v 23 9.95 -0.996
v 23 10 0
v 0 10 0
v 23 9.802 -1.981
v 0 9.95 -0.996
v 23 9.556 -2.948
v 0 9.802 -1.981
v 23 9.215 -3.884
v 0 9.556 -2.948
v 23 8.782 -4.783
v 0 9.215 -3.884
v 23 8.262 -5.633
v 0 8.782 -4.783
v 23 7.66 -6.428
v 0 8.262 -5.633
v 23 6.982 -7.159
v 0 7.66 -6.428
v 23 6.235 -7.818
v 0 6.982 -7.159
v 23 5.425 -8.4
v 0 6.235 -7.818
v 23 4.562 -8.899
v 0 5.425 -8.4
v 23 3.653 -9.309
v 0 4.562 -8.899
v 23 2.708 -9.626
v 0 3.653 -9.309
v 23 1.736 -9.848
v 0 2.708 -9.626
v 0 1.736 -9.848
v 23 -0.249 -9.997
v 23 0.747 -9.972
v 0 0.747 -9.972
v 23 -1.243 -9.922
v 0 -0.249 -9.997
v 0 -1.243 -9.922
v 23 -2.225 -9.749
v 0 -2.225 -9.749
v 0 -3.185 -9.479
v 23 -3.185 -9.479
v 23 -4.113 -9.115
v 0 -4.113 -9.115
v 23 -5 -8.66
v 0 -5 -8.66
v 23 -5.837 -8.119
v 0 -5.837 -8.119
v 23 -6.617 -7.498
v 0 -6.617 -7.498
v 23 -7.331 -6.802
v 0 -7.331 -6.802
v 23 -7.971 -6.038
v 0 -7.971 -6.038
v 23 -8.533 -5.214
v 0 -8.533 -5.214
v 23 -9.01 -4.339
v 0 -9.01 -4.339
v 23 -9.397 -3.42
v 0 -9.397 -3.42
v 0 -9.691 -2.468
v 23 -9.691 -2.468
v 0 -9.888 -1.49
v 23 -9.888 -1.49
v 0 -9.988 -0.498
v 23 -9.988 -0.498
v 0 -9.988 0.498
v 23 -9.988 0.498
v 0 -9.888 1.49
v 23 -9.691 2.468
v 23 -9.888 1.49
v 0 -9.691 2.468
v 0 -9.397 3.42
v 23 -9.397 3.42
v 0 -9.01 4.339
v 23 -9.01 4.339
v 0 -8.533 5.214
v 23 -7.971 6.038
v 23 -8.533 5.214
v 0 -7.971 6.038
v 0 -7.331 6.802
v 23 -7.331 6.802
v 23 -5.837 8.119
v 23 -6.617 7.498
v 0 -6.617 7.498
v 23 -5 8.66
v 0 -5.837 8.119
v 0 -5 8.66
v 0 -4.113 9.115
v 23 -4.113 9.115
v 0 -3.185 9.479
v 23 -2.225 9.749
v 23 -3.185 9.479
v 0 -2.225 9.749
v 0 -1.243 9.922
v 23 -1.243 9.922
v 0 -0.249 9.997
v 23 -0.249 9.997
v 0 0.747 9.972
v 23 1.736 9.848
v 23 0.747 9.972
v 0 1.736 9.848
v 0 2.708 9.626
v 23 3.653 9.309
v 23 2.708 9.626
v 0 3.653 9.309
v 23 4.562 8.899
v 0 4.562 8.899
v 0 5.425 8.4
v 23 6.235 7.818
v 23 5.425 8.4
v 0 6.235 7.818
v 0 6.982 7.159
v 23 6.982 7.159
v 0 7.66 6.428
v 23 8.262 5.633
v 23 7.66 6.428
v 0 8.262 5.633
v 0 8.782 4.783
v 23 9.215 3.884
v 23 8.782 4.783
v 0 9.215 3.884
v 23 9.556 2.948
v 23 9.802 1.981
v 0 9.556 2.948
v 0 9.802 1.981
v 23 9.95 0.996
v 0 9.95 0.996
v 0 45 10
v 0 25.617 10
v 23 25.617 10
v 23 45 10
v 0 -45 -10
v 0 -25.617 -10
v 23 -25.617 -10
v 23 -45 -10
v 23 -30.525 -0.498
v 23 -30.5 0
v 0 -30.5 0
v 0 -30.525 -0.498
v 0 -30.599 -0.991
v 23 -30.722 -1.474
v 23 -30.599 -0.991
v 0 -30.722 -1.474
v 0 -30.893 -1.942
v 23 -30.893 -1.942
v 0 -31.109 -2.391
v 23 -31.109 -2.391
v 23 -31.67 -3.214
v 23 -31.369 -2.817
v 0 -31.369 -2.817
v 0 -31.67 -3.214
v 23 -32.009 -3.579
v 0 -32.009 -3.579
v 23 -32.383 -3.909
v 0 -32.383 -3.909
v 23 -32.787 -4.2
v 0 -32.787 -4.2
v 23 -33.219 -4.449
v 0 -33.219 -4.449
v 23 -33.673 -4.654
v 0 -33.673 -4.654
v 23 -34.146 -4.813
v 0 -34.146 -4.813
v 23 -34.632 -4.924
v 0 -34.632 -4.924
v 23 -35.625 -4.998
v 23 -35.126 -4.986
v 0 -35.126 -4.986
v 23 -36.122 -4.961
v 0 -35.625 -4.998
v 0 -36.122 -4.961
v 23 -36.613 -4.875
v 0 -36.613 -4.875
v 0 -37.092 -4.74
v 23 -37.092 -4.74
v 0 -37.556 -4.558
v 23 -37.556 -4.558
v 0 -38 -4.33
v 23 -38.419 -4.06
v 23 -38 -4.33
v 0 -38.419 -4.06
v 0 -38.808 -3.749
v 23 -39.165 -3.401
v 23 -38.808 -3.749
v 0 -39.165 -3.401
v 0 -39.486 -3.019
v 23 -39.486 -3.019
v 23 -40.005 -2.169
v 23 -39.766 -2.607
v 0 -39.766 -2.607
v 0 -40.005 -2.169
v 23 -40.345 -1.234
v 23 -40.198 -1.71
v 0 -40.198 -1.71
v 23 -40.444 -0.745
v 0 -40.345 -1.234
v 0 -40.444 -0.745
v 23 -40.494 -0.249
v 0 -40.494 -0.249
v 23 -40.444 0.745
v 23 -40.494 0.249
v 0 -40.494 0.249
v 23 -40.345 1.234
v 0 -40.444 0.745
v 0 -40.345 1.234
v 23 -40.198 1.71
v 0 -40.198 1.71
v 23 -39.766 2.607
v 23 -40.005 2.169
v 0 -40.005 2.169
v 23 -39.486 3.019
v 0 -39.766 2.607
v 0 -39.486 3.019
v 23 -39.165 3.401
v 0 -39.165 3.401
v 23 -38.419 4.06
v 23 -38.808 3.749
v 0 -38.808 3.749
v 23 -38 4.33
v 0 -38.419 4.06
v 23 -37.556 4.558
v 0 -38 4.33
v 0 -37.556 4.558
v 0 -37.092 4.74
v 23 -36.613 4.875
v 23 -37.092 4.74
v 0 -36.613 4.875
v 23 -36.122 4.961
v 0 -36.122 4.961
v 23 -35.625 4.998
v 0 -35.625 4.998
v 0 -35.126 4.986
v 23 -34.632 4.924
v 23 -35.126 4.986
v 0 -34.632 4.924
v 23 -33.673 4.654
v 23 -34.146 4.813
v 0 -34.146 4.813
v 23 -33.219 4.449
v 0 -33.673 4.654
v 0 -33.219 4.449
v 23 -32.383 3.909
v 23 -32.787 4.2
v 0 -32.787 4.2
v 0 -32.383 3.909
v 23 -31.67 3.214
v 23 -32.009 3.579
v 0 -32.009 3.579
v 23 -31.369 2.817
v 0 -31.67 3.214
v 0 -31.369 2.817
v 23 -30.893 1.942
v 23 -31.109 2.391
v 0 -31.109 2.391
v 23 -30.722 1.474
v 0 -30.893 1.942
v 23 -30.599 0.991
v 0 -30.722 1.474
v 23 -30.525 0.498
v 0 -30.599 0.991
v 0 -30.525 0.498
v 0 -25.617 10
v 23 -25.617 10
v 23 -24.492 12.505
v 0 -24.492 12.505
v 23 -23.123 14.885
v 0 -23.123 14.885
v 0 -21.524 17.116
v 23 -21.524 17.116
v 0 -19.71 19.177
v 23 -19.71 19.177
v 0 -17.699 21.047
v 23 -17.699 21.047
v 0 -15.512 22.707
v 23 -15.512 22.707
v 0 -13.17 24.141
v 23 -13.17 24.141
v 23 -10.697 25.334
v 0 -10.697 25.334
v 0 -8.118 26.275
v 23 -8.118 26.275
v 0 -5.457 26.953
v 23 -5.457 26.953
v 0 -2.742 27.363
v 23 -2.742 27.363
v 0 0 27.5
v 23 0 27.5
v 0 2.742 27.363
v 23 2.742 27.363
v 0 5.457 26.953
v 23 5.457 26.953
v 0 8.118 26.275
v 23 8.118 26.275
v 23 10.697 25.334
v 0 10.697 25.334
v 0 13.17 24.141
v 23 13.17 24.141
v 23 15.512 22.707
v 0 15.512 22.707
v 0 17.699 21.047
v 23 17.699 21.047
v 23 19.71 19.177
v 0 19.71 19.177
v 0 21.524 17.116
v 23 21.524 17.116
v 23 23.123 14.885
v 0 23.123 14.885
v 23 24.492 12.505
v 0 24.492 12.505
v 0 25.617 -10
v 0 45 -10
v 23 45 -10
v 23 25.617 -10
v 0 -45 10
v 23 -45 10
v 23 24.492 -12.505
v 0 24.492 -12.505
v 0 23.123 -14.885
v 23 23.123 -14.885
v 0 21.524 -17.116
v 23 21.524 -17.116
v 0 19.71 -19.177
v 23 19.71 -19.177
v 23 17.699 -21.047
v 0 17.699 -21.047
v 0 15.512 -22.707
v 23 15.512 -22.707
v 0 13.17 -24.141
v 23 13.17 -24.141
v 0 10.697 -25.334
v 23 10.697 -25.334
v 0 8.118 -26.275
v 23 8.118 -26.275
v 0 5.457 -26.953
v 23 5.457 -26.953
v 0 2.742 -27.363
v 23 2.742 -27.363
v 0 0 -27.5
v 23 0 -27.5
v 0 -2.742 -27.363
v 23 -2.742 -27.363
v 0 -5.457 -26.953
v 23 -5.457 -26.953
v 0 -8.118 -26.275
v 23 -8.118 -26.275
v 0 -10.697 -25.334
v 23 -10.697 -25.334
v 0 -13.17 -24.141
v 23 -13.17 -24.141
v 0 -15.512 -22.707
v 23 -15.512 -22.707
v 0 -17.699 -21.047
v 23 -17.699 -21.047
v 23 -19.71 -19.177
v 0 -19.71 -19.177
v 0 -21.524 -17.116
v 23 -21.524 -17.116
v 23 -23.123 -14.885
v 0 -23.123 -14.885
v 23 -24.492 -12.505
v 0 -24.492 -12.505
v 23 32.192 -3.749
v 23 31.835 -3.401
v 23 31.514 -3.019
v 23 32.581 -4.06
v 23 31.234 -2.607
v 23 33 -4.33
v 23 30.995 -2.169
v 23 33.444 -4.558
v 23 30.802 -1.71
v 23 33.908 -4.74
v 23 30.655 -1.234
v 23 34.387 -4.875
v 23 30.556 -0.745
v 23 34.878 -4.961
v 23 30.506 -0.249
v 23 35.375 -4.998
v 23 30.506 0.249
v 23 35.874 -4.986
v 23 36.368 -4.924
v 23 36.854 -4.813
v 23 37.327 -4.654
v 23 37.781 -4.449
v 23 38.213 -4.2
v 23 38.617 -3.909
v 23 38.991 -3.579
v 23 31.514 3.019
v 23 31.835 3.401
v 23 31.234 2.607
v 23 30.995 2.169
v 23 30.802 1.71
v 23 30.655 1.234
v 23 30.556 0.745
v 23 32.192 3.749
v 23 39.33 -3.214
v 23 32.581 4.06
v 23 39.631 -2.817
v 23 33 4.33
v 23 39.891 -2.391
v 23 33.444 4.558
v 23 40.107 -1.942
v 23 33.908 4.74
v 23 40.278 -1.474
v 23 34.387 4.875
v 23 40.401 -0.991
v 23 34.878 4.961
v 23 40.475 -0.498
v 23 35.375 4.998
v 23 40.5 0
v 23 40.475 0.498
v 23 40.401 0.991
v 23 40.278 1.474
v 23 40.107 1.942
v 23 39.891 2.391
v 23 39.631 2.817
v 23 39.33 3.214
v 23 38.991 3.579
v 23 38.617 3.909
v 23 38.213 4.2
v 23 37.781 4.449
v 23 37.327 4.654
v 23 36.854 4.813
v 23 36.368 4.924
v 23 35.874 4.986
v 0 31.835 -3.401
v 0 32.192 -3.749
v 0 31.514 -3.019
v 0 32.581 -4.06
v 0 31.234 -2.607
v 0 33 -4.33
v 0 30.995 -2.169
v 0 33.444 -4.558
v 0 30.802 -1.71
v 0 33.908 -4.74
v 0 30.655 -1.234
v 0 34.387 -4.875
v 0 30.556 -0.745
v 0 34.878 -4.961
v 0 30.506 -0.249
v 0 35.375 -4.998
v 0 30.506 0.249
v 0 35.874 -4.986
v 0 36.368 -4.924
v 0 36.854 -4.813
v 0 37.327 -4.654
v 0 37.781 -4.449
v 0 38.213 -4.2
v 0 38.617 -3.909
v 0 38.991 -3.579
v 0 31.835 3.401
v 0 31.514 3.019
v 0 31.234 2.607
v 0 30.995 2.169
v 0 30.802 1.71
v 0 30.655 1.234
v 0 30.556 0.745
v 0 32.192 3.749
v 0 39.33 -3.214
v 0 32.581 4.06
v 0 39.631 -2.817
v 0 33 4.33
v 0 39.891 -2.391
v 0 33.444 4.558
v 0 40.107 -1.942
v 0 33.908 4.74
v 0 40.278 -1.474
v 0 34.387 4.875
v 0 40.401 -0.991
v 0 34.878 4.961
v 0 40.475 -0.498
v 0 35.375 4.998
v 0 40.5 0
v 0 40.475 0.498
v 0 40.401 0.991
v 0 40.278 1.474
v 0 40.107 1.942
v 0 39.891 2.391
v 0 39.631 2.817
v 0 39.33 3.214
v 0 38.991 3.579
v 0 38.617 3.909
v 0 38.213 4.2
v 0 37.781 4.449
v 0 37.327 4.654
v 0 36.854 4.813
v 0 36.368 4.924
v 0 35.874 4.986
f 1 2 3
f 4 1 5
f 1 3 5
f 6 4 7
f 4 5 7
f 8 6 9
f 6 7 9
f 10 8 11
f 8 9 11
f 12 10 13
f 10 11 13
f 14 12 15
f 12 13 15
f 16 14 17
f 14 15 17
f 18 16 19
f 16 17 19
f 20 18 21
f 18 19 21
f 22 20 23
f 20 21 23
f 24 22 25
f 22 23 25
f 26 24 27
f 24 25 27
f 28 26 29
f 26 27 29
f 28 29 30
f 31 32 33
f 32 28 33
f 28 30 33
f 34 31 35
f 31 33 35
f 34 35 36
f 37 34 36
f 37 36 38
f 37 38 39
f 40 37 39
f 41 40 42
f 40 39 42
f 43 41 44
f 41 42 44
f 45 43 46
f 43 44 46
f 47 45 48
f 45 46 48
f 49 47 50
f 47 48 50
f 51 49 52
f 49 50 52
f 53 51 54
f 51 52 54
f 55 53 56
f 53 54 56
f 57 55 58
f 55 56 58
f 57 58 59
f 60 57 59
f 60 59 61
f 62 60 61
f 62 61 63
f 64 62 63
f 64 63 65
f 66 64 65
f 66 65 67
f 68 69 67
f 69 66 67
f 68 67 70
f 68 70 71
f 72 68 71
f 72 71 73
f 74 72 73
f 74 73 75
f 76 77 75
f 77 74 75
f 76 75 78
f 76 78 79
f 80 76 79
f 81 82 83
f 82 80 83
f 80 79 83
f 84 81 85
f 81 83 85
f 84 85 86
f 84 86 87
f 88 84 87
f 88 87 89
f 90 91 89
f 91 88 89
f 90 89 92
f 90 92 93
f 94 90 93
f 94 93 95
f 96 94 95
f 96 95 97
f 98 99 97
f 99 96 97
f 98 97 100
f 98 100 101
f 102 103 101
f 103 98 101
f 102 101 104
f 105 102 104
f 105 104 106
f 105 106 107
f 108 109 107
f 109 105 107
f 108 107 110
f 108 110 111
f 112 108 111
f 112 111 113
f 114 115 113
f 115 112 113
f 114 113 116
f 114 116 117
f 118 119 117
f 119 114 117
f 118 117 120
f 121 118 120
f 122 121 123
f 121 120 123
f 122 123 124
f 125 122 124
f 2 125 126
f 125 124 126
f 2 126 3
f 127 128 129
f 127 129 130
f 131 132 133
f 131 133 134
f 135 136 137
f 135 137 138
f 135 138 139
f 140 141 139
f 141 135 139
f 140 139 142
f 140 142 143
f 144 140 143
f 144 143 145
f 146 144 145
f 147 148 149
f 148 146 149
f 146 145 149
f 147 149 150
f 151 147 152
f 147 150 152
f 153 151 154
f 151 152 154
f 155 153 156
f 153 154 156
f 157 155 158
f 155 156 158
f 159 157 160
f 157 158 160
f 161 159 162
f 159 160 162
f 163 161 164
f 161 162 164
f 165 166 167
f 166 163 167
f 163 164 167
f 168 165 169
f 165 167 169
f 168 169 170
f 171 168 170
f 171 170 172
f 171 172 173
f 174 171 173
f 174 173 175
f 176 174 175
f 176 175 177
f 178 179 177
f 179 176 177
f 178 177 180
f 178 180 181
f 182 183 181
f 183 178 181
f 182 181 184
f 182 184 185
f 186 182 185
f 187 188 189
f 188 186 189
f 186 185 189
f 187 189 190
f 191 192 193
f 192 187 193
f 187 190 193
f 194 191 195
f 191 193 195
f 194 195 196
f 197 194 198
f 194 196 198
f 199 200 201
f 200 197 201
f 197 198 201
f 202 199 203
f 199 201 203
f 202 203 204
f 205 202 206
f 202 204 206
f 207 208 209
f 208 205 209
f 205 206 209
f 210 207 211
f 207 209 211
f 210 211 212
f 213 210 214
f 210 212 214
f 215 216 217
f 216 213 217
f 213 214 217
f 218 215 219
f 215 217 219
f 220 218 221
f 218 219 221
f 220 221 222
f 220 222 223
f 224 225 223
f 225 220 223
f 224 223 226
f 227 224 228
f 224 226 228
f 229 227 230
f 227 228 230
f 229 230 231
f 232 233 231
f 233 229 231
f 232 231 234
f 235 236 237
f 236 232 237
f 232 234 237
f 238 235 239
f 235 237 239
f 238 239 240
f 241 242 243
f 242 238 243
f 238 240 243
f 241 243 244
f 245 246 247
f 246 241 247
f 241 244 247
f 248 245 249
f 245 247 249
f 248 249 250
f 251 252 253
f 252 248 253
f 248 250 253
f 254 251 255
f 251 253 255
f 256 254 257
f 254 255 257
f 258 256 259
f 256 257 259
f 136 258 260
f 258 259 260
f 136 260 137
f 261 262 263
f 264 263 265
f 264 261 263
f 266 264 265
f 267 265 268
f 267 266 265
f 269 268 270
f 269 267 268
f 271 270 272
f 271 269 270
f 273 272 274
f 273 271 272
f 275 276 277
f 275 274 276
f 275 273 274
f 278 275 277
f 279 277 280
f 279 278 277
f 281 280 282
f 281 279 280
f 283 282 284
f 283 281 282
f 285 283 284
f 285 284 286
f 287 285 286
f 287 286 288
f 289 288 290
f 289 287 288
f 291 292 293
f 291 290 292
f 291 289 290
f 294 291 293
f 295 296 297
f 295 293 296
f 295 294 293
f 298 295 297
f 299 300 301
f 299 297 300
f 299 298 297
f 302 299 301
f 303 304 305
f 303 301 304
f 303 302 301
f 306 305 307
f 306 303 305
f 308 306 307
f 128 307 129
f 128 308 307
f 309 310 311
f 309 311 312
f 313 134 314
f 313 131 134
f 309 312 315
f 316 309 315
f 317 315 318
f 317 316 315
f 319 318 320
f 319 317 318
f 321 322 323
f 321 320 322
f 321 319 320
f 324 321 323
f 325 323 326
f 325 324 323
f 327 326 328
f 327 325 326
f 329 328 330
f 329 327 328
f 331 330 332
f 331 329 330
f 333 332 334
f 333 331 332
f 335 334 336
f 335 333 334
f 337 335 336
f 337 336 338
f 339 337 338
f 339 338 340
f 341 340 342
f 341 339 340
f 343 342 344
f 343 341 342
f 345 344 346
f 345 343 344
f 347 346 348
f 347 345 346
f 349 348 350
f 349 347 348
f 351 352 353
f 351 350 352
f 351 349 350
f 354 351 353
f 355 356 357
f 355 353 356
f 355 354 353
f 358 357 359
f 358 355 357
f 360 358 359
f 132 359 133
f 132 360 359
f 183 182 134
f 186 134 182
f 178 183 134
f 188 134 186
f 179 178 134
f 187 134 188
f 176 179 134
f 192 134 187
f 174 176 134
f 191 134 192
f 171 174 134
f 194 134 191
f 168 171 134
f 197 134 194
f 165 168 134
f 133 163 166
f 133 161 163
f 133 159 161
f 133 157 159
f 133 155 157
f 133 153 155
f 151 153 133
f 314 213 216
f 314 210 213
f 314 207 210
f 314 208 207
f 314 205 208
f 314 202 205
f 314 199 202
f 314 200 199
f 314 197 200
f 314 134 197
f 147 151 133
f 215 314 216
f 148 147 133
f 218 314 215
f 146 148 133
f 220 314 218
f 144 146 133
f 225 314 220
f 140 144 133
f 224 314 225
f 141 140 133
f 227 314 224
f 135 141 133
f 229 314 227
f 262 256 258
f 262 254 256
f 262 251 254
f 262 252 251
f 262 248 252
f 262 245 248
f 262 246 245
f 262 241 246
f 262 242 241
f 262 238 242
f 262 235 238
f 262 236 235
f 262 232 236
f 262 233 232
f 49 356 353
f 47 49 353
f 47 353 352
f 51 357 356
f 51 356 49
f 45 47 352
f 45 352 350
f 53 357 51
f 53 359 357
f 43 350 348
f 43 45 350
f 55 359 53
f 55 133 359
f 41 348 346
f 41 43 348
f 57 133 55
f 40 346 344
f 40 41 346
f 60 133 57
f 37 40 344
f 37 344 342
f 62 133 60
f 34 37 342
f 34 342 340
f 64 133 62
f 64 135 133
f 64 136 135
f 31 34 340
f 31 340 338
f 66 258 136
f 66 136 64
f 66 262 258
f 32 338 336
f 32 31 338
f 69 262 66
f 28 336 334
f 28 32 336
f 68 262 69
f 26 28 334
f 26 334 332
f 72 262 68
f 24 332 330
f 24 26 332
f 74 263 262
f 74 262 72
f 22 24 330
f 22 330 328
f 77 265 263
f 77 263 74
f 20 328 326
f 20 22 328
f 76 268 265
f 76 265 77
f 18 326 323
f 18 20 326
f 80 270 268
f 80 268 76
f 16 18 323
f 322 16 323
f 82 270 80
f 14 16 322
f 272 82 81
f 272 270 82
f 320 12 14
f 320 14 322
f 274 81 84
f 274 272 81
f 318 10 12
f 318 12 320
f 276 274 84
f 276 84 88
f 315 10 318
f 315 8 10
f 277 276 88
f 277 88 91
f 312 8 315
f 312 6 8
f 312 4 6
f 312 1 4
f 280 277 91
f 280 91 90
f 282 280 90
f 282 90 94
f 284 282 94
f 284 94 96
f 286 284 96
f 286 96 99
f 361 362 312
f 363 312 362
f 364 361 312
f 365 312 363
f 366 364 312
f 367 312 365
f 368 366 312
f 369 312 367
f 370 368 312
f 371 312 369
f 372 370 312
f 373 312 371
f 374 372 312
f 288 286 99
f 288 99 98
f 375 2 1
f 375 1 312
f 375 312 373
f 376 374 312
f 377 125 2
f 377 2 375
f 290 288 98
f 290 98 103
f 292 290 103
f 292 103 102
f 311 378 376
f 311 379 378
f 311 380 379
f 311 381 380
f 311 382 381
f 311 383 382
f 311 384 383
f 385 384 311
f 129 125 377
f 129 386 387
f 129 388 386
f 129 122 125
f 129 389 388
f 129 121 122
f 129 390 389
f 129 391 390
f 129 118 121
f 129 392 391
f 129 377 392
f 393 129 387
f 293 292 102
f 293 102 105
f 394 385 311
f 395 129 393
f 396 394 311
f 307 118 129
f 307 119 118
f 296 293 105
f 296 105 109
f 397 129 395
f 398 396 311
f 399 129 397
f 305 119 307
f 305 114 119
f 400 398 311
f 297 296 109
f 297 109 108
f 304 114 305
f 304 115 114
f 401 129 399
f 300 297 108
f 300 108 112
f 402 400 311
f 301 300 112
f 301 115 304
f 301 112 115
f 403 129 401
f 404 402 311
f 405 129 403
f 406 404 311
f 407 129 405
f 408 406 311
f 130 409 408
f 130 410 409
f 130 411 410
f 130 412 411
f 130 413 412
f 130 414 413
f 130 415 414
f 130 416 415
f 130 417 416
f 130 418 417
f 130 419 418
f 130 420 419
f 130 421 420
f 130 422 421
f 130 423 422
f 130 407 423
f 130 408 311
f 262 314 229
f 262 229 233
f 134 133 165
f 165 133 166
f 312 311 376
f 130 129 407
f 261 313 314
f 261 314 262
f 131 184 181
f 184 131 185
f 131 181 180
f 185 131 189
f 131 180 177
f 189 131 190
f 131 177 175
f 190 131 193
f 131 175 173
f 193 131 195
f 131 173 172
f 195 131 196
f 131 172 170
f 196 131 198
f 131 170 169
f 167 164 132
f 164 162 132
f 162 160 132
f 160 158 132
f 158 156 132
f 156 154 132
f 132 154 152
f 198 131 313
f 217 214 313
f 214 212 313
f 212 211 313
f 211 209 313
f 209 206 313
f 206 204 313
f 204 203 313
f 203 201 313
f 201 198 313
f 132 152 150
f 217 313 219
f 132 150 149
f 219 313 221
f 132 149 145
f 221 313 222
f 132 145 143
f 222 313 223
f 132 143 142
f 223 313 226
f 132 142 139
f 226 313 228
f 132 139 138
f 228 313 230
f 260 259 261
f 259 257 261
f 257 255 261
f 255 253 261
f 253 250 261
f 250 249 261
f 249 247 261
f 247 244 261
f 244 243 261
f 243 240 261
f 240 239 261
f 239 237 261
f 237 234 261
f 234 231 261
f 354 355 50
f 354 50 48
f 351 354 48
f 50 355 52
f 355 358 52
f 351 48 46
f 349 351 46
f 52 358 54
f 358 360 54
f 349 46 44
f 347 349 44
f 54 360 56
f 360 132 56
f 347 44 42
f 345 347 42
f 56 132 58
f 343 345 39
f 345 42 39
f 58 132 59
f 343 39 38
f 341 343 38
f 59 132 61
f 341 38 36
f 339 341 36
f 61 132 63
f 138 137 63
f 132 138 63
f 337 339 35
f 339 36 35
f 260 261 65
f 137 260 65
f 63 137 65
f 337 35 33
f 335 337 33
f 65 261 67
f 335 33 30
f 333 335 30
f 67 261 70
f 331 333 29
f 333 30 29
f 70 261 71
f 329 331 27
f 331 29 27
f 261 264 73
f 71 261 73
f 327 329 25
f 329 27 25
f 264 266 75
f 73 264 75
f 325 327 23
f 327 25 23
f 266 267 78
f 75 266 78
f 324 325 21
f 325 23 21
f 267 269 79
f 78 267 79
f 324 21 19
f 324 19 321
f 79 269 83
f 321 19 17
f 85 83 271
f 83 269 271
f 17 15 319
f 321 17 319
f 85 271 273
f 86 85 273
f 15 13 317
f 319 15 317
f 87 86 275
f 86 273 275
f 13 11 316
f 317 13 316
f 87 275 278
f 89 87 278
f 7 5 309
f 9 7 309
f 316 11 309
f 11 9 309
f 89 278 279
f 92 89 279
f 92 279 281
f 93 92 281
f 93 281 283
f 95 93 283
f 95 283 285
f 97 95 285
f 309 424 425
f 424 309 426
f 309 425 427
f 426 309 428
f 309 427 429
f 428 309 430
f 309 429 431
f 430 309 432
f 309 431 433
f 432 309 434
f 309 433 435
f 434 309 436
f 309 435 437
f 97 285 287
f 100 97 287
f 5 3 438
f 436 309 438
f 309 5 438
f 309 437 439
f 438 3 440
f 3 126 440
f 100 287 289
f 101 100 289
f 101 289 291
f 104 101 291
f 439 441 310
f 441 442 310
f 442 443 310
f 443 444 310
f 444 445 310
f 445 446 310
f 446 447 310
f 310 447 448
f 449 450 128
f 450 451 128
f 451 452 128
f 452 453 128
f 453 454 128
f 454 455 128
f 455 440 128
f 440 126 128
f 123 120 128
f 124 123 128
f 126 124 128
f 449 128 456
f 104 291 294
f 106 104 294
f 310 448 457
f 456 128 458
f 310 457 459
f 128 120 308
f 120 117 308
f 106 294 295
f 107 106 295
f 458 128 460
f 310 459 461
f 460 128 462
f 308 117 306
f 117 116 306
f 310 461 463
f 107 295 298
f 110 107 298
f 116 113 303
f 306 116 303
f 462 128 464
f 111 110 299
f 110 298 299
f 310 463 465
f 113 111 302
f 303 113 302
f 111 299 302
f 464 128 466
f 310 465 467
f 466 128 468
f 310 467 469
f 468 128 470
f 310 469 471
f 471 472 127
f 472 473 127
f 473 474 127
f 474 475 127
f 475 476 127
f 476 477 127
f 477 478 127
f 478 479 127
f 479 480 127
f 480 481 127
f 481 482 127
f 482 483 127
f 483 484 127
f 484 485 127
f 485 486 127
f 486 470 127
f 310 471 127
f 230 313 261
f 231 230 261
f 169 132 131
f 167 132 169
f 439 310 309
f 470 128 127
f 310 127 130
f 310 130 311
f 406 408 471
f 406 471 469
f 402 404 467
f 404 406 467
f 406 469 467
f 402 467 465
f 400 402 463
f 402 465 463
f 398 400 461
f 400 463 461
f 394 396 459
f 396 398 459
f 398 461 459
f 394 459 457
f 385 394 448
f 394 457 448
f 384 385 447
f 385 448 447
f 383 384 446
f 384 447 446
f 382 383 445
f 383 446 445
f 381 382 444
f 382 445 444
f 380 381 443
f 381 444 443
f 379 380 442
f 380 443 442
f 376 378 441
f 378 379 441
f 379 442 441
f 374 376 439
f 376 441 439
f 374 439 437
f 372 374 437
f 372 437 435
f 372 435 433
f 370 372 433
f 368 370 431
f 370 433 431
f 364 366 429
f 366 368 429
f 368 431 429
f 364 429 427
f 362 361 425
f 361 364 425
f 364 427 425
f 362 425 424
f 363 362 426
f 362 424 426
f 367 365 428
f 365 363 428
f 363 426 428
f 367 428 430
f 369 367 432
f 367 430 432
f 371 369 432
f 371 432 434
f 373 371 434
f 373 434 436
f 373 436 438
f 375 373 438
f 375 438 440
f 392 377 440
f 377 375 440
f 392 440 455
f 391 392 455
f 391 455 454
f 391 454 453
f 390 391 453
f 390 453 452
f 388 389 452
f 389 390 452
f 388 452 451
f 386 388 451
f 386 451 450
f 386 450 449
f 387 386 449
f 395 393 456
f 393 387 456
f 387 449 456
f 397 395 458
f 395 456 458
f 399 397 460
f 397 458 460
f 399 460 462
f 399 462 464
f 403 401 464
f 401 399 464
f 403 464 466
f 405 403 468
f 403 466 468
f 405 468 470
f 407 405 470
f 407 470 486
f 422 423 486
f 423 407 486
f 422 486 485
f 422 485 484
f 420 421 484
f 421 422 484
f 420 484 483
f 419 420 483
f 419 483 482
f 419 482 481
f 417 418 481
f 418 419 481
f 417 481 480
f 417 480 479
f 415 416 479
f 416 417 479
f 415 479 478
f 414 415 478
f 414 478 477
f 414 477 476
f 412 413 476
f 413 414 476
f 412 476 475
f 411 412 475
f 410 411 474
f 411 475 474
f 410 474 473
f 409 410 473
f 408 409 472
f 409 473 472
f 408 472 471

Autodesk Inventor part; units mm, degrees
ref_plane "YZ Plane" through (0, 0, 0) normal (1, 0, 0) x (0, 1, 0)
ref_plane "XZ Plane" through (0, 0, 0) normal (0, 1, 0) x (-1, 0, 0)
ref_plane "XY Plane" through (0, 0, 0) normal (0, 0, 1) x (1, 0, 0)
sketch "Sketch1" plane through (0, 0, 0) normal (1, 0, 0) x (0, 1, 0)
  circle A0 centre (0, 0) radius 10
  circle A1 centre (0, 0) radius 27.5
  circle A2 centre (35.5, 0) radius 5
  circle A3 centre (-35.5, 0) radius 5
  line L0 (-35.5, 0) -> (35.5, 0) construction
  line L1 (0, 0) -> (10, 0) construction
  line L2 (0, 0) -> (10, 0) construction
  line L3 (-45, 10) -> (45, 10)
  line L4 (45, 10) -> (45, -10)
  line L5 (45, -10) -> (-45, -10)
  line L6 (-45, -10) -> (-45, 10)
  line L7 (-45, 10) -> (45, -10) construction
  line L8 (45, 10) -> (-45, -10) construction
  dimension "d0" = 20
  dimension "d1" = 55
  dimension "d2" = 10
  dimension "d3" = 10
  dimension "d4" = 71
  dimension "d5" = 10
  dimension "d6" = 0
  dimension "d7" = 35.5
  dimension "d8" = 90
  dimension "d9" = 20
extrude "Extrusion1" add sketch "Sketch1" along normal blind 23 contours A0 L3 A1 L5 | A0 L5 A1 L3 | L3 A1 | L5 A1 | A1 L5 L6 L3 | L3 L4 L5 A1
properties part number "KFL004"
